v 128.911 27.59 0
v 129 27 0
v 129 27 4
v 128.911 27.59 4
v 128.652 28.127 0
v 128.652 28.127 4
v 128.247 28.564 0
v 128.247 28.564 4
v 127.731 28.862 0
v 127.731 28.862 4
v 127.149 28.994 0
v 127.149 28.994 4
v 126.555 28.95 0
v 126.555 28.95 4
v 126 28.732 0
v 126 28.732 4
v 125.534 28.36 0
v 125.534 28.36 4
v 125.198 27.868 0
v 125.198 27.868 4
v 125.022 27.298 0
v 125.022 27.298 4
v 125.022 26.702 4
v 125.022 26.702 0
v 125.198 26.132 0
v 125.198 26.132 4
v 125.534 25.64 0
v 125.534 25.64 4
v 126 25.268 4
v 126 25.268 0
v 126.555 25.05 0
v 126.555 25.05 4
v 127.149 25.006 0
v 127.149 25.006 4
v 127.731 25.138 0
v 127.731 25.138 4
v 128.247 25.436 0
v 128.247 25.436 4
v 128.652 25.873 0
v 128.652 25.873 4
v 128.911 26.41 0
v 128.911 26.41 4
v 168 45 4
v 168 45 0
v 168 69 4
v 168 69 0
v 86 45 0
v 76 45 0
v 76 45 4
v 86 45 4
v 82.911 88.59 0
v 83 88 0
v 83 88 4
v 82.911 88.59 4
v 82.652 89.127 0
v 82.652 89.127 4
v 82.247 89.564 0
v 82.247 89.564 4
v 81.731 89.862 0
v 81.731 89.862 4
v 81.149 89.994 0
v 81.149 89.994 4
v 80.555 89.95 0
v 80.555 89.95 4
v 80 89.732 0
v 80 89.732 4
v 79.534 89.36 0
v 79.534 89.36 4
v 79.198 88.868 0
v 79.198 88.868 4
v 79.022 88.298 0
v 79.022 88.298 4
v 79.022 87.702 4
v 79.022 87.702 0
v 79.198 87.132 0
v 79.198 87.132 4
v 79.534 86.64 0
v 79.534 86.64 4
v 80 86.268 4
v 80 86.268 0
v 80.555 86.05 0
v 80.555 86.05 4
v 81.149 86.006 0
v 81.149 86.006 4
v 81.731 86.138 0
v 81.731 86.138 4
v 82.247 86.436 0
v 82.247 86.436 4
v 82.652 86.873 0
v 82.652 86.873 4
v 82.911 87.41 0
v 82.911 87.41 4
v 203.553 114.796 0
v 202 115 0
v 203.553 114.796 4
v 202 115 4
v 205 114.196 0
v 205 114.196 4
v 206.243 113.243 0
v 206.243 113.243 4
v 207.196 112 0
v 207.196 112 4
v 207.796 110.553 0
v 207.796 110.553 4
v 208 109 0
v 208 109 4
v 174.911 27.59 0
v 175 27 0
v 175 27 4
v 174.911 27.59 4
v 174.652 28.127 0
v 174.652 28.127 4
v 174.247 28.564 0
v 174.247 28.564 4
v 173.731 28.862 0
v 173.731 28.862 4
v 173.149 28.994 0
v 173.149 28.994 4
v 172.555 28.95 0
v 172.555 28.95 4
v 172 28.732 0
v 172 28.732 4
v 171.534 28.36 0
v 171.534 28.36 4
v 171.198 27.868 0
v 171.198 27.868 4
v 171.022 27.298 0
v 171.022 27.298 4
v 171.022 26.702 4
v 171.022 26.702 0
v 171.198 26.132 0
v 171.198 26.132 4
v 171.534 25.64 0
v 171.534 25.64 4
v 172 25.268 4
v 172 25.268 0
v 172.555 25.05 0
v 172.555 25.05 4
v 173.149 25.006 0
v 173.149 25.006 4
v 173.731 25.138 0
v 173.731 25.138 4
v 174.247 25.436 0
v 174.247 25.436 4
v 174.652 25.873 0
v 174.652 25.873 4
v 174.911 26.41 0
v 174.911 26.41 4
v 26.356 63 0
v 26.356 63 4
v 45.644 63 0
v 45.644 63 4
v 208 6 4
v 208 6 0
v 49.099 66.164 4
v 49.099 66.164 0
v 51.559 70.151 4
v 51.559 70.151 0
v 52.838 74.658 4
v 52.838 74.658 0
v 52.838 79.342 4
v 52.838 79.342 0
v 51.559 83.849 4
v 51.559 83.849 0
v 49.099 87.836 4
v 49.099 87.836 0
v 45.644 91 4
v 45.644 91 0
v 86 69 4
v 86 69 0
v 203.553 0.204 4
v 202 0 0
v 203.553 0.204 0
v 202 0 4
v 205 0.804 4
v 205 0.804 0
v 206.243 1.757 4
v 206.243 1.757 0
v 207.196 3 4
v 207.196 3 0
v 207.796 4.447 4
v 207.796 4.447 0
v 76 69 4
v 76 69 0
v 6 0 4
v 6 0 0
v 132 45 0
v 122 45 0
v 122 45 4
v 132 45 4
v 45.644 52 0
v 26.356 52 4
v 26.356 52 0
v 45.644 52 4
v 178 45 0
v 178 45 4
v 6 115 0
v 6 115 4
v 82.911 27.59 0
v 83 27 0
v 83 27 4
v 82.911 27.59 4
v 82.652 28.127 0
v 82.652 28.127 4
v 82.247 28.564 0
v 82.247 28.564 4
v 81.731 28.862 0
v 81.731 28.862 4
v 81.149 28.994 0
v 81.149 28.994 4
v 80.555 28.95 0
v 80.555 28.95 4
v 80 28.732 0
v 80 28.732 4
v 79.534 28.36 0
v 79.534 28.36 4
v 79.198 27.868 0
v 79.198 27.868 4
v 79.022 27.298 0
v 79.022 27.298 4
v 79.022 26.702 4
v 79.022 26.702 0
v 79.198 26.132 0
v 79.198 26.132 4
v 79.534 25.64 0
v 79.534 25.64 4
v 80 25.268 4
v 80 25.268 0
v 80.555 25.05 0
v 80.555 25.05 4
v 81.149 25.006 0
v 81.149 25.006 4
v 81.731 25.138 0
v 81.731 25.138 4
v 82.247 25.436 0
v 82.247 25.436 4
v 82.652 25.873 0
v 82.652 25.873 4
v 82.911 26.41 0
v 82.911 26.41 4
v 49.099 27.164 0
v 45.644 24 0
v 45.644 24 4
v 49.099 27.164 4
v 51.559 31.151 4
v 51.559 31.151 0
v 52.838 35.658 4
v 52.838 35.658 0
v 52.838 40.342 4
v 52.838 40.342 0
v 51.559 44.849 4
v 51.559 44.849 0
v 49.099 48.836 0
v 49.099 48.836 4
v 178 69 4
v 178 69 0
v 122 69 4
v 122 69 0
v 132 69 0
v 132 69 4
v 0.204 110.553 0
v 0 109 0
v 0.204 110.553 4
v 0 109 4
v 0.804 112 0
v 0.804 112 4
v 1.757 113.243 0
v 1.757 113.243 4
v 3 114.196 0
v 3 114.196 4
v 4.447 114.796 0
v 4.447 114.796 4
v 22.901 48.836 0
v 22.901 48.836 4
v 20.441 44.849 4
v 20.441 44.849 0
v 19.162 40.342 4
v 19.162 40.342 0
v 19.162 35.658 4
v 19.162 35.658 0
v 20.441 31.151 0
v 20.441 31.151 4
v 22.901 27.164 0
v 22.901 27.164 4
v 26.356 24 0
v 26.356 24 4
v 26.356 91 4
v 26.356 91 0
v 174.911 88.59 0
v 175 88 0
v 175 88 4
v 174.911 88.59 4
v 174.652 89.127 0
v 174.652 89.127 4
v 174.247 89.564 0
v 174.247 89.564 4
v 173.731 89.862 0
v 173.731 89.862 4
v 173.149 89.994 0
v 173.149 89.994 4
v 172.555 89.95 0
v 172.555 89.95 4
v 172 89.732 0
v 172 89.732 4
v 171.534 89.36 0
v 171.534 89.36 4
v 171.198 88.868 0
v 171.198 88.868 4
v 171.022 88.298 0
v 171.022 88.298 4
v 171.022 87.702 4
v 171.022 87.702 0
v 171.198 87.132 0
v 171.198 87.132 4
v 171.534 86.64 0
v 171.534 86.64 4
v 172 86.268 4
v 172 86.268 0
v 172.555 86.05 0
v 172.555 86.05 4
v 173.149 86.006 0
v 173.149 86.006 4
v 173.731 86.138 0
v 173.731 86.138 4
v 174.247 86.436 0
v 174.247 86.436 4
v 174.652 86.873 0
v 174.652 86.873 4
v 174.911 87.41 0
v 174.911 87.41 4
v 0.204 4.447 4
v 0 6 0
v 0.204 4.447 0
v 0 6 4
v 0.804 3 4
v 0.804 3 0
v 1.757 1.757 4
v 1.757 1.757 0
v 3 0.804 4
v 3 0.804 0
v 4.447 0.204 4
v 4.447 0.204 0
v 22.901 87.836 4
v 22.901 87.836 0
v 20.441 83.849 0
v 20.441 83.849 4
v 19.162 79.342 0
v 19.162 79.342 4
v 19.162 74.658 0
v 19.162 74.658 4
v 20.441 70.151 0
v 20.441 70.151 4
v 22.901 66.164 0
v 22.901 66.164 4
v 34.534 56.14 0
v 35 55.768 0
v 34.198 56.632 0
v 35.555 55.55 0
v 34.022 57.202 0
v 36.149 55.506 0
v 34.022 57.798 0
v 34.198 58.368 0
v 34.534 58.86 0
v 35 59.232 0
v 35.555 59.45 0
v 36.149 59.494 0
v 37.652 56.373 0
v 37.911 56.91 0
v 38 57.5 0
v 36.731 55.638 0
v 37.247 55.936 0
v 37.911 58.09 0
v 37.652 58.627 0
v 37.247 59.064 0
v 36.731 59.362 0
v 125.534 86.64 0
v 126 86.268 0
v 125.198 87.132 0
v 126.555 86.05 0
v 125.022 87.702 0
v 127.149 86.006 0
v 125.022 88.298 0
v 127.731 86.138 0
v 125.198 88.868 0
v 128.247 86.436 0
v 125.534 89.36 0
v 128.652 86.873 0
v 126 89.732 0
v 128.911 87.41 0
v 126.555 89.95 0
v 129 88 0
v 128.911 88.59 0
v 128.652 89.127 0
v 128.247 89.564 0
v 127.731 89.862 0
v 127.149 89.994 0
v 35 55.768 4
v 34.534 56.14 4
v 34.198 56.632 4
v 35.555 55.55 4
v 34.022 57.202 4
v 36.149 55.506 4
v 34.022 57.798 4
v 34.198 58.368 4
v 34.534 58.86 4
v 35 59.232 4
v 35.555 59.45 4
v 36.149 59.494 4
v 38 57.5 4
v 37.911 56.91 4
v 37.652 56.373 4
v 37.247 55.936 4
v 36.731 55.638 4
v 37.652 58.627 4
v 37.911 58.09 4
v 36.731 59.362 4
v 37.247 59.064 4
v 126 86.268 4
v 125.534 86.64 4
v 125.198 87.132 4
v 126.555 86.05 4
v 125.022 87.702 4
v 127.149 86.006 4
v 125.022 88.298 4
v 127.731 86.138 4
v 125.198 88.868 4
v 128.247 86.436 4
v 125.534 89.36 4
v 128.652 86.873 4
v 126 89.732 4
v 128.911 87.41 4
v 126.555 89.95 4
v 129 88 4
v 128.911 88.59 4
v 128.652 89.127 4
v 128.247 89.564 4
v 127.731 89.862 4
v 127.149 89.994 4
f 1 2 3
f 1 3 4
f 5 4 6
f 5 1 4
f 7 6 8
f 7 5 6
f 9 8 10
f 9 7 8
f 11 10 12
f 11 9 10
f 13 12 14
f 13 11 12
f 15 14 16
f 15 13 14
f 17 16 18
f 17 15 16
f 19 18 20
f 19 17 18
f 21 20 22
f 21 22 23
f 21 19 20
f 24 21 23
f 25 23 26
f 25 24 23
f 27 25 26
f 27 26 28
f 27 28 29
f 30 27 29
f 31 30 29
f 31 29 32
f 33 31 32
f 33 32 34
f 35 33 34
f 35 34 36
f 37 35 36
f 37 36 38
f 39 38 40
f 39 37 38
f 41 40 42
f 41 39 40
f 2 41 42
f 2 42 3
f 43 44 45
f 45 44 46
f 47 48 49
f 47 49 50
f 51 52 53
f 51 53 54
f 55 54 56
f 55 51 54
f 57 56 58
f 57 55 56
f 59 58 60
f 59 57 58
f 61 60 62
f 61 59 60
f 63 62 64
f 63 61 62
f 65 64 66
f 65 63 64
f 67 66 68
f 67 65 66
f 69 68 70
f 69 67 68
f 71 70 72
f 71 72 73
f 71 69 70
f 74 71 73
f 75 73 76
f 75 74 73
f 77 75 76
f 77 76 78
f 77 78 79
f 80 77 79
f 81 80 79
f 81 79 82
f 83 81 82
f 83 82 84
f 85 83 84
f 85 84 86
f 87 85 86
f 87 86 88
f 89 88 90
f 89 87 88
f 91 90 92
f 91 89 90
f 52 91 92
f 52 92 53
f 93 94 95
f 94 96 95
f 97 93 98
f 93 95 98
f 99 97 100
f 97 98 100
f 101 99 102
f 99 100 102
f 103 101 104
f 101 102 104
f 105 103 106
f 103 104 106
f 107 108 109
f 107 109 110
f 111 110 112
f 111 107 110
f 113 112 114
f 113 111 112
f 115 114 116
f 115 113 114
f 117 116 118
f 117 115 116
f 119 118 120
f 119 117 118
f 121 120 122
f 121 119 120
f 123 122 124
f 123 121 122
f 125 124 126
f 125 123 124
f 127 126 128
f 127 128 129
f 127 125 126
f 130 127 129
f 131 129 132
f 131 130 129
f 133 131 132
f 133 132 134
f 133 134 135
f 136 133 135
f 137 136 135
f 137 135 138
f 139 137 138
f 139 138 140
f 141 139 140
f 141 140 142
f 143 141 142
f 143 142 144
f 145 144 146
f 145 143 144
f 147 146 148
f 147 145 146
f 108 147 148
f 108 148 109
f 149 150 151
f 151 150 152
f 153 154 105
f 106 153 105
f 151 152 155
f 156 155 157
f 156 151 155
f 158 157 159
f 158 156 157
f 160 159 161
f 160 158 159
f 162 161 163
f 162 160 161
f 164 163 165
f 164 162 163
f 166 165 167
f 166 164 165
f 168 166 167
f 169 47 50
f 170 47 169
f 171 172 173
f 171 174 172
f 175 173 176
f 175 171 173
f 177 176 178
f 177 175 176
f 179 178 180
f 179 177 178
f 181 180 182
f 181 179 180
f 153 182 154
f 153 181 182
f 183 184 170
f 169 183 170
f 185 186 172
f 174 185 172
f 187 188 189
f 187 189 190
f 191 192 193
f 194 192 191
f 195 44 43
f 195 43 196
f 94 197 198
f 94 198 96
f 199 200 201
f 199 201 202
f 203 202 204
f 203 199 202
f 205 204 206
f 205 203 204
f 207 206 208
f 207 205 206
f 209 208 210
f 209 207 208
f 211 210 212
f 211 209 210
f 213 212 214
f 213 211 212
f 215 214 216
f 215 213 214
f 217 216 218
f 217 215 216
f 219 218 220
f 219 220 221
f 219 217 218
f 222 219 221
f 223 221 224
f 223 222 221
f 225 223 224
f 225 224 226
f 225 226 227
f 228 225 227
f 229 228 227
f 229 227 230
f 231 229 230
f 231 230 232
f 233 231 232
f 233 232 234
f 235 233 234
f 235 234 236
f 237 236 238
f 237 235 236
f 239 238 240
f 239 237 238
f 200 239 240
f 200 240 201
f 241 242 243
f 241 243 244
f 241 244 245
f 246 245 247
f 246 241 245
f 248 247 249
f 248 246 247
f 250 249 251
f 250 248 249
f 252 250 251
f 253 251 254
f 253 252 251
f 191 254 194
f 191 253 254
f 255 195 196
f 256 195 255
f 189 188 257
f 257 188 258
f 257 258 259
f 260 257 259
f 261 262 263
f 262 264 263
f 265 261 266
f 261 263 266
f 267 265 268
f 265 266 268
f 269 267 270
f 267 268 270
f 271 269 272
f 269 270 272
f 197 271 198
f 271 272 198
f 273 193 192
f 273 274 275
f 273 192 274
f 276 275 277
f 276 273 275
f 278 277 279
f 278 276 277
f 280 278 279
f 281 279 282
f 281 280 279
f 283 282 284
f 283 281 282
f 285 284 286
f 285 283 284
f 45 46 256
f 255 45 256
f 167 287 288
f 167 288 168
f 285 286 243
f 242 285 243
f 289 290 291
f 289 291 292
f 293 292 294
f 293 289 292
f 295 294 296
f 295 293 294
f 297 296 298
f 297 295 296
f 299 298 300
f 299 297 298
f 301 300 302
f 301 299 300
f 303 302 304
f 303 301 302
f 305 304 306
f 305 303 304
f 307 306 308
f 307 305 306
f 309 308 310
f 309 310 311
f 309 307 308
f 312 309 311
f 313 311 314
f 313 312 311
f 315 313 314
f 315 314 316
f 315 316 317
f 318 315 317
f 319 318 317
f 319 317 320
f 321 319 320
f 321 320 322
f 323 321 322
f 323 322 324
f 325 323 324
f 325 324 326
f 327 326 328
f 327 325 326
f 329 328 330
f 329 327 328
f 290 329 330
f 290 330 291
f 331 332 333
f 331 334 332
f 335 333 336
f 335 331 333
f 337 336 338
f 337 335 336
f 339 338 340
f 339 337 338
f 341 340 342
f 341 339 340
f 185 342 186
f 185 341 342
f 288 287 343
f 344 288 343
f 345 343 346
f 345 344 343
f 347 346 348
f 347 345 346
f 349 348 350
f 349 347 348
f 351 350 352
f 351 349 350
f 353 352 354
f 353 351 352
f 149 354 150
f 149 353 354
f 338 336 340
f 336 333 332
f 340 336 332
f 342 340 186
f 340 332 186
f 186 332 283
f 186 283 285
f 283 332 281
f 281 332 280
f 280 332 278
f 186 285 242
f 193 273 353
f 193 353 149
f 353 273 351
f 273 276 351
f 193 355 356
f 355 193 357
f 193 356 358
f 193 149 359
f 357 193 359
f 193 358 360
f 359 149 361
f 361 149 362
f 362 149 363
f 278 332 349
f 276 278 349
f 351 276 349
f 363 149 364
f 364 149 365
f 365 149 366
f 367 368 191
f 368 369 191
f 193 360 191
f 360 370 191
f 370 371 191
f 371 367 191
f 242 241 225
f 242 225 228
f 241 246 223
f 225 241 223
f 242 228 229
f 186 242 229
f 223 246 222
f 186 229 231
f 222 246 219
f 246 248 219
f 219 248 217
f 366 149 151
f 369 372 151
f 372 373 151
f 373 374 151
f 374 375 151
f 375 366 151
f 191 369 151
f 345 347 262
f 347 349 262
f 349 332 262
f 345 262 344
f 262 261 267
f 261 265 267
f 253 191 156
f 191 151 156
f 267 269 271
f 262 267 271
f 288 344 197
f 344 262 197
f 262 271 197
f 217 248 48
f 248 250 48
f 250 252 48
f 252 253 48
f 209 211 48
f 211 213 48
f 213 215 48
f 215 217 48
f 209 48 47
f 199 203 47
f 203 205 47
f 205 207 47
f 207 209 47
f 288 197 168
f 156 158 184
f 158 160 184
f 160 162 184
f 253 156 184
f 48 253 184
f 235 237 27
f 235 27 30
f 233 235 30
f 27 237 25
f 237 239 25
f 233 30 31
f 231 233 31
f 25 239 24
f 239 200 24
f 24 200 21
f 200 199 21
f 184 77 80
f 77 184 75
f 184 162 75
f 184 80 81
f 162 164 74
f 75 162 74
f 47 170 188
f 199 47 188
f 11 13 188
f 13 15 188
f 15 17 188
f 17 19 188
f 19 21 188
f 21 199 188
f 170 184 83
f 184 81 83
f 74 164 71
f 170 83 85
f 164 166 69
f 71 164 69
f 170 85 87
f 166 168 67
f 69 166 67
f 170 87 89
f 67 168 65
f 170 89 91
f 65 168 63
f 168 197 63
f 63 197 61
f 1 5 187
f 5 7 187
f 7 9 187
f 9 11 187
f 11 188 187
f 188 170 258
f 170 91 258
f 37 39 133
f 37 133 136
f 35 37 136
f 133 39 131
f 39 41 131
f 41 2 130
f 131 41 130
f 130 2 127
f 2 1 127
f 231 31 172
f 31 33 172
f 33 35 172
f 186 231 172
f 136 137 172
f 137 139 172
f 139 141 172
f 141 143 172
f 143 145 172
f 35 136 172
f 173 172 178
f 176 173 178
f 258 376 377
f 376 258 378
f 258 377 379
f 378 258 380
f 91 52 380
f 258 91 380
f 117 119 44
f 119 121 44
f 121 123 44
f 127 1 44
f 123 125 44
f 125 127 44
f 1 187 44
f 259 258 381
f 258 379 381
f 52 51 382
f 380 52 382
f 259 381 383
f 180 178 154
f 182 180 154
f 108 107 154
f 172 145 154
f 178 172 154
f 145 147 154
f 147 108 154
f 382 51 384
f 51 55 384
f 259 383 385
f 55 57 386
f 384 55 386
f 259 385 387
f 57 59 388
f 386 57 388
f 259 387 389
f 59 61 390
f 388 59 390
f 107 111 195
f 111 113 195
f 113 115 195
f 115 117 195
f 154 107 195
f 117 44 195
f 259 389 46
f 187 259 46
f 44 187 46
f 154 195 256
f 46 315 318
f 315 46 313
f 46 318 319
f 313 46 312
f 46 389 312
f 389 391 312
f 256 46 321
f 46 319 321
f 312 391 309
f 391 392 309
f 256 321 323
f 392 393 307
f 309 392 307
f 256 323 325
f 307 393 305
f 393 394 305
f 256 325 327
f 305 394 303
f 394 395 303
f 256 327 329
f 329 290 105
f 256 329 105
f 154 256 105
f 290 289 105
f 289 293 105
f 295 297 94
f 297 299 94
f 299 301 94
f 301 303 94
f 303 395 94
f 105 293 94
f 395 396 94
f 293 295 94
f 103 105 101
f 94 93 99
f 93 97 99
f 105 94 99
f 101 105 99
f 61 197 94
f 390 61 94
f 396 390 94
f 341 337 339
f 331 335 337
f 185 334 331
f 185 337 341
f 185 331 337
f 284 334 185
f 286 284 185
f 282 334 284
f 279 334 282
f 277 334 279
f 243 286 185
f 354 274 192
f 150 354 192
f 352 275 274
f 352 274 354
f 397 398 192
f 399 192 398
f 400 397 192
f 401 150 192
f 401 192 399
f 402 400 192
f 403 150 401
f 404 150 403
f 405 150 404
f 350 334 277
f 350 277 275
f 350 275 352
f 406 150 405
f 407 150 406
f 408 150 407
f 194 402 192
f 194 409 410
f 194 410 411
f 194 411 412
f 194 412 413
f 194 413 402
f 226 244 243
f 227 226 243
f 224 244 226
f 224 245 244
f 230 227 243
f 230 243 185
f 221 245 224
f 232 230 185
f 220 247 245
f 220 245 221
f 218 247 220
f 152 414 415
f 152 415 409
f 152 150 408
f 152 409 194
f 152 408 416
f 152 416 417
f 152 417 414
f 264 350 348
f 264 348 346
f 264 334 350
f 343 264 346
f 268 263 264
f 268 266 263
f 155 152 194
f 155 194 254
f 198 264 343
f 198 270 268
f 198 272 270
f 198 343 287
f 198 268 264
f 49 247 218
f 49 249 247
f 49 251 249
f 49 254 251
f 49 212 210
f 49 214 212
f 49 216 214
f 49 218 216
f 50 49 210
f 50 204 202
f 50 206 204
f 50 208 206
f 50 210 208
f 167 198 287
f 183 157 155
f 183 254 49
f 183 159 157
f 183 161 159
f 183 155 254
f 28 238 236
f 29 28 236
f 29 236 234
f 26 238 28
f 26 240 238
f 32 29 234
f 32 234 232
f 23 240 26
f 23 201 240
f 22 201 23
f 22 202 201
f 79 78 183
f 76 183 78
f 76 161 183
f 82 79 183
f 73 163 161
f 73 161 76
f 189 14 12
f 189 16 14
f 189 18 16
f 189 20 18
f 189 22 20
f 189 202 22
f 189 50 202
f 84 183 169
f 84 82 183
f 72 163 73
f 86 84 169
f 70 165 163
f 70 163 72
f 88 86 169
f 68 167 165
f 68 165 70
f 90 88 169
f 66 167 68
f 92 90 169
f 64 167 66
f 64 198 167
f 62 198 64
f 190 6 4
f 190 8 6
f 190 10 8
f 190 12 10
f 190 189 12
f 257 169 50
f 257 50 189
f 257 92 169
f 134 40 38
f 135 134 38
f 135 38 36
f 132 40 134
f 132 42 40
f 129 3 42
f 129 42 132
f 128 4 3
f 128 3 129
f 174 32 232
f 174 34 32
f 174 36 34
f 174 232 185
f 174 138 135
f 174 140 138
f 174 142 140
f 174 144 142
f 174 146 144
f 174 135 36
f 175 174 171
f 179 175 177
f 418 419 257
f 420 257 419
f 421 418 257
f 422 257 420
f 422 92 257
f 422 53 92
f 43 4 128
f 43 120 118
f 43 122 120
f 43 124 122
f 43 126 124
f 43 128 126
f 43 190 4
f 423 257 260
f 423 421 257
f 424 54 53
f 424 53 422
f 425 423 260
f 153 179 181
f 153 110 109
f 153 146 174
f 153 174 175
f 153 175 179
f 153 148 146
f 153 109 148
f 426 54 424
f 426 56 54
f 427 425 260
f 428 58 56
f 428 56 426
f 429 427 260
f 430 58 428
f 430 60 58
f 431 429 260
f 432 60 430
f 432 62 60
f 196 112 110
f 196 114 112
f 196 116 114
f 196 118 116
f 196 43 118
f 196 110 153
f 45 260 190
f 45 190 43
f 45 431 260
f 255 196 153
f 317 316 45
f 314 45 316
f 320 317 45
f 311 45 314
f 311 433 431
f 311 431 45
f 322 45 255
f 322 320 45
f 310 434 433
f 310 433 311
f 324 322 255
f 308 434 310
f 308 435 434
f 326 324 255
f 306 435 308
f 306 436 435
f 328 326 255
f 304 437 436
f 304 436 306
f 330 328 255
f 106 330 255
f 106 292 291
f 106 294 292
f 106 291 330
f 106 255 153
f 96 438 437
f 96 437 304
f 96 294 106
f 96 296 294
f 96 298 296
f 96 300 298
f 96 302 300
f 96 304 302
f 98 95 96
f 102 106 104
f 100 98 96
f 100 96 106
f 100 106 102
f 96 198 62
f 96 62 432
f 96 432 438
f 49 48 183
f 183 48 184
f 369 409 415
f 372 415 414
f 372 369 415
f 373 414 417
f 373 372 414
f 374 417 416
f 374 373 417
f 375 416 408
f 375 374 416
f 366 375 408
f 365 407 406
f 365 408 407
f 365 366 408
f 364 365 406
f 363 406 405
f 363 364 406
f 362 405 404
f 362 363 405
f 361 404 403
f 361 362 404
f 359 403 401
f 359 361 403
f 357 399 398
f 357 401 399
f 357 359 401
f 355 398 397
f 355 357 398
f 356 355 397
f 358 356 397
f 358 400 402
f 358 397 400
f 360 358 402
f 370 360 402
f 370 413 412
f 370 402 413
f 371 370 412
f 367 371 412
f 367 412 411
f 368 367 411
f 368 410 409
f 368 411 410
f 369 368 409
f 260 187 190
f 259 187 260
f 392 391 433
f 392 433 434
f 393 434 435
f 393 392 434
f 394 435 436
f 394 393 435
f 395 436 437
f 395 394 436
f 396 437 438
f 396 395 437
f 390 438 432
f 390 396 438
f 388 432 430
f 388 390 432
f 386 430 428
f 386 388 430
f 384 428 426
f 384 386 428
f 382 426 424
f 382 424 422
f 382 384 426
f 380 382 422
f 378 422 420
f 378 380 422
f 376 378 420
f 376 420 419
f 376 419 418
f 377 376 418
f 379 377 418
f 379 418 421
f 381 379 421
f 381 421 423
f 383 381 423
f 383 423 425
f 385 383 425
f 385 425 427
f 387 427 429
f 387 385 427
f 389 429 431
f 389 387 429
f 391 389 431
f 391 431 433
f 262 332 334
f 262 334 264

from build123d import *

# Parameters (mm, degrees)
F0_W     = 208
F0_H     = 115
F0_R     = 2
F0_W_2   = 10
F0_H_2   = 24
F1_DEPTH = 4
F2_R     = 6
F4_R     = 2
F4_R_2   = 17
F5_DEPTH = 25
F6_W     = 27.550638
F6_H     = 3.205147
F6_W_2   = 29.028984
F6_H_2   = 3.037915
F6_W_3   = 33.224199
F6_H_3   = 3
F7_DEPTH = 4


with BuildPart() as f1:
    # F0 (on Top) → F1 (new body)
    with BuildSketch(Plane.XY):
        with Locations((104, 57.5)):
            Rectangle(F0_W, F0_H)
        with Locations((81, 27)):
            Circle(F0_R, mode=Mode.SUBTRACT)
        with Locations((81, 57)):
            Rectangle(F0_W_2, F0_H_2, mode=Mode.SUBTRACT)
        with Locations((127, 27)):
            Circle(F0_R, mode=Mode.SUBTRACT)
        with Locations((173, 27)):
            Circle(F0_R, mode=Mode.SUBTRACT)
        with Locations((127, 57)):
            Rectangle(F0_W_2, F0_H_2, mode=Mode.SUBTRACT)
        with Locations((173, 57)):
            Rectangle(F0_W_2, F0_H_2, mode=Mode.SUBTRACT)
        with Locations((81, 88)):
            Circle(F0_R, mode=Mode.SUBTRACT)
        with Locations((127, 88)):
            Circle(F0_R, mode=Mode.SUBTRACT)
        with Locations((173, 88)):
            Circle(F0_R, mode=Mode.SUBTRACT)
    extrude(amount=F1_DEPTH)

    # F2
    f2_edges = [f1.edges().sort_by_distance(p)[0] for p in [
        (0, 115, 2),
        (208, 115, 2),
        (208, 0, 2),
        (0, 0, 2),
    ]]
    fillet(f2_edges, radius=F2_R)

    # F4 (on Top) → F5 (cut)
    with BuildSketch(Plane.XY):
        with Locations((36, 57.5)):
            Circle(F4_R)
        with Locations((36, 77)):
            Circle(F4_R_2)
        with Locations((36, 38)):
            Circle(F4_R_2)
    extrude(amount=F5_DEPTH, mode=Mode.SUBTRACT)

    # F6 (on face) → F7 (join)
    with BuildSketch(Plane.XY.offset(4)):
        Polygon((32.74464, 94.836249), (25.32669, 91), (46.063566, 91), (43.255925, 94.420469), align=None)
        with Locations((37.412647, 61.397426)):
            Rectangle(F6_W, F6_H)
        with Locations((37.197317, 53.518957)):
            Rectangle(F6_W_2, F6_H_2)
        with Locations((36.739217, 22.5)):
            Rectangle(F6_W_3, F6_H_3)
    extrude(amount=-F7_DEPTH)


solid = f1.part
